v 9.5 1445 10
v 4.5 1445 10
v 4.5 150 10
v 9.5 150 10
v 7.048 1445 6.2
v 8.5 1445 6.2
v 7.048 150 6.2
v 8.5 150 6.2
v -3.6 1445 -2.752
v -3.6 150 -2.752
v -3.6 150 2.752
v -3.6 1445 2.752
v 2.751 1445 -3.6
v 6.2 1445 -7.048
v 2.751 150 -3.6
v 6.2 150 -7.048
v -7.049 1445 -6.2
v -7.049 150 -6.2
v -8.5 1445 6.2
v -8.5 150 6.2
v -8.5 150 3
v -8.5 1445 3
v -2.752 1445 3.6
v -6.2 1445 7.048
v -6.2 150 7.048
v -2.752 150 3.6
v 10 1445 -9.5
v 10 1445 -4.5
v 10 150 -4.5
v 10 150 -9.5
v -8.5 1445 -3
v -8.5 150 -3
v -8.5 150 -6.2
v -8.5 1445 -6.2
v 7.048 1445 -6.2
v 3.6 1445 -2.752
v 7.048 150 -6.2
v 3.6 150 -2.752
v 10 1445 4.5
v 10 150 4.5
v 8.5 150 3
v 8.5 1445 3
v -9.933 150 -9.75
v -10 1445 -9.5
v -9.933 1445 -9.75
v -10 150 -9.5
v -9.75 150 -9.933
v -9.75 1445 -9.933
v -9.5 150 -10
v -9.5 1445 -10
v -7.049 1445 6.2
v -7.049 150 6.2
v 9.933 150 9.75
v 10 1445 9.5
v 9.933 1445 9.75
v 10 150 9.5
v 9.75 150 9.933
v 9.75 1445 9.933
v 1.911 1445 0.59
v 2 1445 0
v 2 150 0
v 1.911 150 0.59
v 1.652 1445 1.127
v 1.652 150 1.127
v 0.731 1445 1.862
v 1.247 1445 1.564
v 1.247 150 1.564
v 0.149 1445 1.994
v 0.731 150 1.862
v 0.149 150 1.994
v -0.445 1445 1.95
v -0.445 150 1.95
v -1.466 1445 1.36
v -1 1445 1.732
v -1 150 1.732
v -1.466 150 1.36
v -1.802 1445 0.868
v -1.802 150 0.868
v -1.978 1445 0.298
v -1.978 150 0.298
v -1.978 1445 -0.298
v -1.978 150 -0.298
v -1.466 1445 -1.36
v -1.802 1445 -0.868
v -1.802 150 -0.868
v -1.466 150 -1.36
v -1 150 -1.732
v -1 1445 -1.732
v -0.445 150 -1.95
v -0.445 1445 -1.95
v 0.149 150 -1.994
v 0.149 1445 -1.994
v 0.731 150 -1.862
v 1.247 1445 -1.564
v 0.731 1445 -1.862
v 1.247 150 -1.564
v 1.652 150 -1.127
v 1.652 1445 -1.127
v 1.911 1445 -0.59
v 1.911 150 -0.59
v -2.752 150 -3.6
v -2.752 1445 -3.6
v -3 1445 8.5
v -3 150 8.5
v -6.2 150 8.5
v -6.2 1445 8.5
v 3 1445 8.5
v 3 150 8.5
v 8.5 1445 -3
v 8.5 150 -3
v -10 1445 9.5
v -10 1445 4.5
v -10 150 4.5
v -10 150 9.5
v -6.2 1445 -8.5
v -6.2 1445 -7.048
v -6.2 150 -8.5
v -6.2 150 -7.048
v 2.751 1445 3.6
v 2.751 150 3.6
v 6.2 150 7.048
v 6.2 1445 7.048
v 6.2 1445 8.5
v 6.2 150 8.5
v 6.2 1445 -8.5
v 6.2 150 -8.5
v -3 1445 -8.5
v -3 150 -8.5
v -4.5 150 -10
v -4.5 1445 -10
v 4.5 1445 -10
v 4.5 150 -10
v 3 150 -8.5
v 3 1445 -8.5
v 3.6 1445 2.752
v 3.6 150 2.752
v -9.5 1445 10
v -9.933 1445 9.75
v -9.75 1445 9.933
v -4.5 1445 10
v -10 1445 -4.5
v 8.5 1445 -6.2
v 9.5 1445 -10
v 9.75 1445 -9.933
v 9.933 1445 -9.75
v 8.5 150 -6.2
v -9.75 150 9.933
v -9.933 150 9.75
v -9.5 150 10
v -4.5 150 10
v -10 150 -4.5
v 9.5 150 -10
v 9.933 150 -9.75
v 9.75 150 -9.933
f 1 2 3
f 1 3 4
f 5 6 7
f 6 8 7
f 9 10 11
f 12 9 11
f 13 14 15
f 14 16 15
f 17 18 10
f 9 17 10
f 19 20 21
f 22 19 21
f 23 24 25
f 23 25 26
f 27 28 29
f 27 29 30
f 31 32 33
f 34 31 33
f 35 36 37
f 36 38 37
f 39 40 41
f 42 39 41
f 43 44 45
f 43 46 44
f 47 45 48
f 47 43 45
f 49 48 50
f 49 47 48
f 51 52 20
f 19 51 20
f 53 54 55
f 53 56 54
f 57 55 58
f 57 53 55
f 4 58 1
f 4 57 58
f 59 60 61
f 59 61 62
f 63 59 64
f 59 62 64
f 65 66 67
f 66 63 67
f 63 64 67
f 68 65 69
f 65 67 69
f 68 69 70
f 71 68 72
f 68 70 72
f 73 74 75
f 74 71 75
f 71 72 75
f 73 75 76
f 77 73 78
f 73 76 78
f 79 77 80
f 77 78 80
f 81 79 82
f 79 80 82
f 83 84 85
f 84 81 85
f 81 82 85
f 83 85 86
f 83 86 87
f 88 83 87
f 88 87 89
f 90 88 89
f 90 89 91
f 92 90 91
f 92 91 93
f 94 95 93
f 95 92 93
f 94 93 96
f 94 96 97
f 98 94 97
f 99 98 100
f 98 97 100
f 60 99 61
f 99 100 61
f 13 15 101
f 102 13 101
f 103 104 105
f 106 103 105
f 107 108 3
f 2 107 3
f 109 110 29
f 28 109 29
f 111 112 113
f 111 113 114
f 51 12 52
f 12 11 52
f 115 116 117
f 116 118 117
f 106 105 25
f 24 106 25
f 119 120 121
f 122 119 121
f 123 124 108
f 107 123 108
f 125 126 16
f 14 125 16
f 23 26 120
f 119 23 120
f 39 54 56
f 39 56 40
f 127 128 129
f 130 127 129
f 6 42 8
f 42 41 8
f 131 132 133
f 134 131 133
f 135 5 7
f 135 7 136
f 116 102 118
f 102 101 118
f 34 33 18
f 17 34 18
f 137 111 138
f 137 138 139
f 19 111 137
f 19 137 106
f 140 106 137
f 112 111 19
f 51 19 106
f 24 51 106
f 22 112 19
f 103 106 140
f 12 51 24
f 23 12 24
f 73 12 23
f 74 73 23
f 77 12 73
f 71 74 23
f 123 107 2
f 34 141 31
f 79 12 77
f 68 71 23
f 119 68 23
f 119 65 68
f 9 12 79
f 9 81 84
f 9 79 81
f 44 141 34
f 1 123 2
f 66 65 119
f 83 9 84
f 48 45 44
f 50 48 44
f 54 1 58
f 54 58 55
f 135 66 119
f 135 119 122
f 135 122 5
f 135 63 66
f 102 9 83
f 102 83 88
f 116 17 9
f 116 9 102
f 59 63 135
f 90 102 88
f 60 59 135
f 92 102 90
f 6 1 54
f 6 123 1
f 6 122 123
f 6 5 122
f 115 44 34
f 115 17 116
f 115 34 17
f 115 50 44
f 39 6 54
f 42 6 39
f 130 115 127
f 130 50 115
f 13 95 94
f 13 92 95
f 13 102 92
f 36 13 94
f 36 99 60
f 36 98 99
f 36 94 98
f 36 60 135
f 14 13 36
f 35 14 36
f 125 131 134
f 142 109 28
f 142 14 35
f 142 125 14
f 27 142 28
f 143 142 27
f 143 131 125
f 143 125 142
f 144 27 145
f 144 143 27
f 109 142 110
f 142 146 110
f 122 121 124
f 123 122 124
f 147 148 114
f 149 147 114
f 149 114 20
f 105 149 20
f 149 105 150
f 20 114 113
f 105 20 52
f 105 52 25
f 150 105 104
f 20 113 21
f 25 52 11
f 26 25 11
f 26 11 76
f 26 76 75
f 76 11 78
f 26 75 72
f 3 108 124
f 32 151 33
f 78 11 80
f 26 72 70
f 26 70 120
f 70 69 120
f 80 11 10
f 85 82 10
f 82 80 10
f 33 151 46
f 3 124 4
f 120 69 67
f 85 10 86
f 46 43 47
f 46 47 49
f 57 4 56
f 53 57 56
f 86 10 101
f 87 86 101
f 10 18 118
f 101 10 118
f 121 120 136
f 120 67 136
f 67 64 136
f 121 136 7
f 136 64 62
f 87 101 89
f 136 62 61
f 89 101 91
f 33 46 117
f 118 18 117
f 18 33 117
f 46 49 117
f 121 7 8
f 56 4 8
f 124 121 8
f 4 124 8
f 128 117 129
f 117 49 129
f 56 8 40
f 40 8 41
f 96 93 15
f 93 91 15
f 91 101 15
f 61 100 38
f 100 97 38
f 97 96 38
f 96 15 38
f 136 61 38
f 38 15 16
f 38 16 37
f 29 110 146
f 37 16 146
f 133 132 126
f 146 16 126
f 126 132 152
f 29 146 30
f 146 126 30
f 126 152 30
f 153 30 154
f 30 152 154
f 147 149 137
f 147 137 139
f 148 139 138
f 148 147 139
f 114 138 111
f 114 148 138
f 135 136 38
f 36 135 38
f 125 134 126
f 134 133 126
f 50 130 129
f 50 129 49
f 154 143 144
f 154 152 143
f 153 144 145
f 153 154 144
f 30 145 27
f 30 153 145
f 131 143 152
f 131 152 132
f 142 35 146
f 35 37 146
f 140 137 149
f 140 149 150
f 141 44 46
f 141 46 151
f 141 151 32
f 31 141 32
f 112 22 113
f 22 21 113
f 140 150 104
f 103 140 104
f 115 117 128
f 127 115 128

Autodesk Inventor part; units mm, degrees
ref_plane "YZ Plane" through (0, 0, 0) normal (1, 0, 0) x (0, 1, 0)
ref_plane "XZ Plane" through (0, 0, 0) normal (0, 1, 0) x (-1, 0, 0)
ref_plane "Work Plane1" through (-2.7515, 150, 3.6) normal (0, 1, 0) x (1, 0, 0)
sketch "Sketch1" plane through (-2.7515, 150, 3.6) normal (0, 1, 0) x (1, 0, 0)
  arc A0 (-6.7485, 13.6) -> (-7.2485, 13.1) centre (-6.7485, 13.1) ccw projected
  line L0 (-7.2485, 13.1) -> (-7.2485, 8.1) projected
  line L1 (-7.2485, 8.1) -> (-5.7485, 6.6) projected
  line L2 (-5.7485, 6.6) -> (-5.7485, 9.8) projected
  line L3 (-5.7485, 9.8) -> (-4.2971, 9.8) projected
  line L4 (-4.2971, 9.8) -> (-0.8485, 6.3515) projected
  line L5 (-0.8485, 6.3515) -> (-0.8485, 0.8485) projected
  line L6 (-0.8485, 0.8485) -> (-4.2971, -2.6) projected
  line L7 (-4.2971, -2.6) -> (-5.7485, -2.6) projected
  line L8 (-5.7485, -2.6) -> (-5.7485, 0.6) projected
  line L9 (-5.7485, 0.6) -> (-7.2485, -0.9) projected
  line L10 (-7.2485, -0.9) -> (-7.2485, -5.9) projected
  arc A1 (-7.2485, -5.9) -> (-6.7485, -6.4) centre (-6.7485, -5.9) ccw projected
  line L11 (-6.7485, -6.4) -> (-1.7485, -6.4) projected
  line L12 (-1.7485, -6.4) -> (-0.2485, -4.9) projected
  line L13 (-0.2485, -4.9) -> (-3.4485, -4.9) projected
  line L14 (-3.4485, -4.9) -> (-3.4485, -3.4485) projected
  line L15 (-3.4485, -3.4485) -> (0, 0) projected
  line L16 (0, 0) -> (5.5029, 0) projected
  line L17 (5.5029, 0) -> (8.9515, -3.4485) projected
  line L18 (8.9515, -3.4485) -> (8.9515, -4.9) projected
  line L19 (8.9515, -4.9) -> (5.7515, -4.9) projected
  line L20 (5.7515, -4.9) -> (7.2515, -6.4) projected
  line L21 (7.2515, -6.4) -> (12.2515, -6.4) projected
  arc A2 (12.2515, -6.4) -> (12.7515, -5.9) centre (12.2515, -5.9) ccw projected
  line L22 (12.7515, -5.9) -> (12.7515, -0.9) projected
  line L23 (12.7515, -0.9) -> (11.2515, 0.6) projected
  line L24 (11.2515, 0.6) -> (11.2515, -2.6) projected
  line L25 (11.2515, -2.6) -> (9.8, -2.6) projected
  line L26 (9.8, -2.6) -> (6.3515, 0.8485) projected
  line L27 (6.3515, 0.8485) -> (6.3515, 6.3515) projected
  line L28 (6.3515, 6.3515) -> (9.8, 9.8) projected
  line L29 (9.8, 9.8) -> (11.2515, 9.8) projected
  line L30 (11.2515, 9.8) -> (11.2515, 6.6) projected
  line L31 (11.2515, 6.6) -> (12.7515, 8.1) projected
  line L32 (12.7515, 8.1) -> (12.7515, 13.1) projected
  arc A3 (12.7515, 13.1) -> (12.2515, 13.6) centre (12.2515, 13.1) ccw projected
  line L33 (12.2515, 13.6) -> (7.2515, 13.6) projected
  line L34 (7.2515, 13.6) -> (5.7515, 12.1) projected
  line L35 (5.7515, 12.1) -> (8.9515, 12.1) projected
  line L36 (8.9515, 12.1) -> (8.9515, 10.6485) projected
  line L37 (8.9515, 10.6485) -> (5.5029, 7.2) projected
  line L38 (5.5029, 7.2) -> (0, 7.2) projected
  line L39 (0, 7.2) -> (-3.4485, 10.6485) projected
  line L40 (-3.4485, 10.6485) -> (-3.4485, 12.1) projected
  line L41 (-3.4485, 12.1) -> (-0.2485, 12.1) projected
  line L42 (-0.2485, 12.1) -> (-1.7485, 13.6) projected
  line L43 (-1.7485, 13.6) -> (-6.7485, 13.6) projected
  circle A4 centre (2.7515, 3.6) radius 2 projected
extrude "Extrusion1" add sketch "Sketch1" along normal blind 1295
ref_plane "Work Plane2" through (9.5, 150, 0) normal (0, 0, 1) x (1, 0, 0)
properties part number "20x20mmx150mm alminum profile" material "Aluminum 6061"
